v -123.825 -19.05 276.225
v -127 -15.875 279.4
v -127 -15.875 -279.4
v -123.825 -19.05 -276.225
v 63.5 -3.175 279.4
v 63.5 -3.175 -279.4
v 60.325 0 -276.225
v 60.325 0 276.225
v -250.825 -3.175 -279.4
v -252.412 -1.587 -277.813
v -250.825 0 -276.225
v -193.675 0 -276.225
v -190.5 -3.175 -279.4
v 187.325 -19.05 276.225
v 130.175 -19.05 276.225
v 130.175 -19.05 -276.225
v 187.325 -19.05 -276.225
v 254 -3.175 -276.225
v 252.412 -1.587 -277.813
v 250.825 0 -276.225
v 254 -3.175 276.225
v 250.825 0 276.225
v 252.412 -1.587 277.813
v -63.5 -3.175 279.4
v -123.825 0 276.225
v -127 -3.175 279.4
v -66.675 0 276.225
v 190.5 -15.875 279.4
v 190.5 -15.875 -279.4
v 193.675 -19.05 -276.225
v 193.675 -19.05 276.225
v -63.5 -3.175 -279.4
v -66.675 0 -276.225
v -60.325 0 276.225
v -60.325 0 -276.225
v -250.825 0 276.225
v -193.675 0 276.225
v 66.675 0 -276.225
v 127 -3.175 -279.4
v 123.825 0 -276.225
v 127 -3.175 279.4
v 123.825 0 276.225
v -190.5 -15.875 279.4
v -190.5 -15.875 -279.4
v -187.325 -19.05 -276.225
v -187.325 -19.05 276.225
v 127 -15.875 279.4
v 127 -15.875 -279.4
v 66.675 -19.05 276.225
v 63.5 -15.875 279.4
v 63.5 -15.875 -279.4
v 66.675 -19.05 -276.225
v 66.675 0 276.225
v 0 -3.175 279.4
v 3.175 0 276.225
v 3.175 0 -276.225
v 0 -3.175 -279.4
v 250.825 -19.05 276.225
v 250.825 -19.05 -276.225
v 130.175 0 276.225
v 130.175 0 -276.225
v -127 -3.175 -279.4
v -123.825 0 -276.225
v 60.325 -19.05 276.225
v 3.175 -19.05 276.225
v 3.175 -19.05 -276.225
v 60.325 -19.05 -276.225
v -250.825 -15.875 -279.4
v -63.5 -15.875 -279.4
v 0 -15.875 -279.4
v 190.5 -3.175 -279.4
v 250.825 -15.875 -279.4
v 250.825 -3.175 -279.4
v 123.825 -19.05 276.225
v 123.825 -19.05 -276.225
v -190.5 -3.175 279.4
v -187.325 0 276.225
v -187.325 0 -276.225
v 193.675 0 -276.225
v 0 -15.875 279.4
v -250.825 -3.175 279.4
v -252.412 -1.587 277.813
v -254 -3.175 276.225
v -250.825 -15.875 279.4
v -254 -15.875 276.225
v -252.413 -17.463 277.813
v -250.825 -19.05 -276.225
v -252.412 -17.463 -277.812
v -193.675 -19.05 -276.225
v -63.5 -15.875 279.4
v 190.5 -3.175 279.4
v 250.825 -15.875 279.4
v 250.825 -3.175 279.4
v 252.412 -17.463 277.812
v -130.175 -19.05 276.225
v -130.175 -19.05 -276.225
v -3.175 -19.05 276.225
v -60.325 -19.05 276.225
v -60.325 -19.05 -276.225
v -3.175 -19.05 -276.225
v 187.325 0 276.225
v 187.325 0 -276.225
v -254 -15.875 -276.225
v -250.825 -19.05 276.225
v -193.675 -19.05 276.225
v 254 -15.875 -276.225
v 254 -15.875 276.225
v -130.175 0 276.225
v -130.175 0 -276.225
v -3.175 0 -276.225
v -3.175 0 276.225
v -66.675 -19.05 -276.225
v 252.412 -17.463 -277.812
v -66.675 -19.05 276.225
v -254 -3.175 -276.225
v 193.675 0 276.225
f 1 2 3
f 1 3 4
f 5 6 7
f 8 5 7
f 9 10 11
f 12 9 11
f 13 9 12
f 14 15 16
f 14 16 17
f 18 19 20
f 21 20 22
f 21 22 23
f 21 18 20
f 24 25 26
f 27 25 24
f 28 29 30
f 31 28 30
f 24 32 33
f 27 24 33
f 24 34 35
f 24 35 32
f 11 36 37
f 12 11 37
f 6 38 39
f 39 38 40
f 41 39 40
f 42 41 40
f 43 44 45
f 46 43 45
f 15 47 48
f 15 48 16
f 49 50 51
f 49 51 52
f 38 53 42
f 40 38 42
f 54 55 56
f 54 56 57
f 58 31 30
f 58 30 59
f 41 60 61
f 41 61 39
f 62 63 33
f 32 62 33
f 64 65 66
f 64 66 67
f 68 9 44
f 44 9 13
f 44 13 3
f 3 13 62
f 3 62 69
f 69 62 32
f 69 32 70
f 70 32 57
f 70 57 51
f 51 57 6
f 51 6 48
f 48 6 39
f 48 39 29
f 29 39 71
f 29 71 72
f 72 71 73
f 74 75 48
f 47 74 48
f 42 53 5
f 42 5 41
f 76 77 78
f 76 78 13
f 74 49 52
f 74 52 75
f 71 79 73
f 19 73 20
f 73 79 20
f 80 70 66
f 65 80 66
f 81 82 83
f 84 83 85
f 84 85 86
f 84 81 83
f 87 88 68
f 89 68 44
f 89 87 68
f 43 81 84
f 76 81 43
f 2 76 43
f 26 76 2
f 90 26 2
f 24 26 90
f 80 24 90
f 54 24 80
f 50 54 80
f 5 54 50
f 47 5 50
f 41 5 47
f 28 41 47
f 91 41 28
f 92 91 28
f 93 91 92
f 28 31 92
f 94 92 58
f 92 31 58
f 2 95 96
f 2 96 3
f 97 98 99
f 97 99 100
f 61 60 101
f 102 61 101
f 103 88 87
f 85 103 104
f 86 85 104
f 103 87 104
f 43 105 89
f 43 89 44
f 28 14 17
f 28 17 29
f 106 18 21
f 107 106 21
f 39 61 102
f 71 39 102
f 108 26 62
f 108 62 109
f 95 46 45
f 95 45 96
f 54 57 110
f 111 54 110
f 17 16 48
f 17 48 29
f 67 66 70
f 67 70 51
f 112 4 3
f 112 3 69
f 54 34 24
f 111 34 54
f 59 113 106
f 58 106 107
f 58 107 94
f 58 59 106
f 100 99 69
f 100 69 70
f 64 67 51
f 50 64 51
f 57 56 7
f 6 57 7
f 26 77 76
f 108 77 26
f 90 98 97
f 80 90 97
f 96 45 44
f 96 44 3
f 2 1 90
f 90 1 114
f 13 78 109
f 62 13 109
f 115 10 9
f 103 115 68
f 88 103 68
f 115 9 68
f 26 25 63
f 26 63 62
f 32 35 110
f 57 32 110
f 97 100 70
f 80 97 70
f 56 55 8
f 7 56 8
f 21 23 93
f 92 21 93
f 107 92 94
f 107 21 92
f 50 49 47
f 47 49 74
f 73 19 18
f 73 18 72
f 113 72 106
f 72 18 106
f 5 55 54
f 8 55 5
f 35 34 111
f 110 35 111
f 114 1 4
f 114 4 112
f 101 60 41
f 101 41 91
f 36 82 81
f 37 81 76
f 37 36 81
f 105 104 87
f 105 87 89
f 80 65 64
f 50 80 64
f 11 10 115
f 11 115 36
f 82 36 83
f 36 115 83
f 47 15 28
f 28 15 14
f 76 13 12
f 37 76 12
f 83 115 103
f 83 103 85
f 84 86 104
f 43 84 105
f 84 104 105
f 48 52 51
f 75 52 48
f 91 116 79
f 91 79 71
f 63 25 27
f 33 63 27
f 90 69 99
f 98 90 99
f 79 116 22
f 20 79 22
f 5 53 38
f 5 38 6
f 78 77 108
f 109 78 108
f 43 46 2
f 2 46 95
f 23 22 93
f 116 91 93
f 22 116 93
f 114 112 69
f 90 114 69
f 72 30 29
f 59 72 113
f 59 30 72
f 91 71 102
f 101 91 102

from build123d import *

# Parameters (mm, degrees)
F0_W      = 508
F0_H      = 558.8
F1_DEPTH  = 19.05
F3_DEPTH  = 558.801
F4_SIZE   = 3.17499
F5_SIZE   = 3.175
F7_DEPTH  = 558.801
F8_SIZE   = 3.17499
F8_SIZE_2 = 3.175


# Not quite as in the source:
# - a fillet or chamfer is up to 0.001 mm smaller than in the source, because OpenCascade refuses the exact size


with BuildPart() as f1:
    # F0 (on Front) → F1 (new body)
    with BuildSketch(Plane.XZ):
        Rectangle(F0_W, F0_H)
    extrude(amount=F1_DEPTH)

    # F2 (on face) → F3 (cut, through all)
    with BuildSketch(Plane(origin=(0, 0, -279.4), x_dir=(1, 0, 0), z_dir=(0, 0, -1))):
        Polygon((190.5, 19.05), (187.325, 19.05), (190.5, 15.875), (193.675, 19.05), align=None)
        Polygon((127, 19.05), (123.825, 19.05), (127, 15.875), (130.175, 19.05), align=None)
        Polygon((63.5, 19.05), (60.325, 19.05), (63.5, 15.875), (66.675, 19.05), align=None)
        Polygon((0, 19.05), (-3.175, 19.05), (0, 15.875), (3.175, 19.05), align=None)
        Polygon((-63.5, 19.05), (-66.675, 19.05), (-63.5, 15.875), (-60.325, 19.05), align=None)
        Polygon((-127, 19.05), (-130.175, 19.05), (-127, 15.875), (-123.825, 19.05), align=None)
        Polygon((-190.5, 19.05), (-193.675, 19.05), (-190.5, 15.875), (-187.325, 19.05), align=None)
    extrude(amount=-F3_DEPTH, mode=Mode.SUBTRACT)

    # F4 (size 3.175 in the source; OpenCascade refuses exactly that, so slightly less here)
    f4_edges = [f1.edges().sort_by_distance(p)[0] for p in [
        (-254, -19.05, 0),
        (-223.8375, -19.05, -279.4),
        (-158.75, -19.05, -279.4),
        (-95.25, -19.05, -279.4),
        (-31.75, -19.05, -279.4),
        (31.75, -19.05, -279.4),
        (95.25, -19.05, -279.4),
        (158.75, -19.05, -279.4),
        (223.8375, -19.05, -279.4),
        (254, -19.05, 0),
        (223.8375, -19.05, 279.4),
        (158.75, -19.05, 279.4),
        (95.25, -19.05, 279.4),
        (31.75, -19.05, 279.4),
        (-31.75, -19.05, 279.4),
        (-95.25, -19.05, 279.4),
        (-158.75, -19.05, 279.4),
        (-223.8375, -19.05, 279.4),
    ]]
    chamfer(f4_edges, length=F4_SIZE)

    # F5
    f5_edges = [f1.edges().sort_by_distance(p)[0] for p in [
        (-254, -7.937505, 279.4),
        (-254, -7.937505, -279.4),
        (254, -7.937505, -279.4),
        (254, -7.937505, 279.4),
    ]]
    chamfer(f5_edges, length=F5_SIZE)

    # F6 (on face) → F7 (cut, through all)
    with BuildSketch(Plane(origin=(0, 0, -279.4), x_dir=(1, 0, 0), z_dir=(0, 0, -1))):
        Polygon((-193.675, 0), (-190.5, 0), (-187.325, 0), (-190.5, 3.175), align=None)
        Polygon((-123.825, 0), (-127, 3.175), (-130.175, 0), (-127, 0), align=None)
        Polygon((-60.325, 0), (-63.5, 3.175), (-66.675, 0), (-63.5, 0), align=None)
        Polygon((3.175, 0), (0, 3.175), (-3.175, 0), (0, 0), align=None)
        Polygon((66.675, 0), (63.5, 3.175), (60.325, 0), (63.5, 0), align=None)
        Polygon((130.175, 0), (127, 3.175), (123.825, 0), (127, 0), align=None)
        Polygon((193.675, 0), (190.5, 3.175), (187.325, 0), (190.5, 0), align=None)
    extrude(amount=-F7_DEPTH, mode=Mode.SUBTRACT)

    # F8 (call 1 of 18: OpenCascade refuses the feature's edges together) (size 3.175 in the source; OpenCascade refuses exactly that, so slightly less here)
    f8_edges = [f1.edges().sort_by_distance(p)[0] for p in [
        (-222.25, 0, -279.4),
    ]]
    chamfer(f8_edges, length=F8_SIZE)

    # F8#2 (call 2 of 18)
    f8_2_edges = [f1.edges().sort_by_distance(p)[0] for p in [
        (-254, 0, 0),
    ]]
    chamfer(f8_2_edges, length=F8_SIZE_2)

    # F8#3 (call 3 of 18) (size 3.175 in the source; OpenCascade refuses exactly that, so slightly less here)
    f8_3_edges = [f1.edges().sort_by_distance(p)[0] for p in [
        (-158.75, 0, -279.4),
    ]]
    chamfer(f8_3_edges, length=F8_SIZE)

    # F8#4 (call 4 of 18) (size 3.175 in the source; OpenCascade refuses exactly that, so slightly less here)
    f8_4_edges = [f1.edges().sort_by_distance(p)[0] for p in [
        (-95.25, 0, -279.4),
    ]]
    chamfer(f8_4_edges, length=F8_SIZE)

    # F8#5 (call 5 of 18) (size 3.175 in the source; OpenCascade refuses exactly that, so slightly less here)
    f8_5_edges = [f1.edges().sort_by_distance(p)[0] for p in [
        (-31.75, 0, -279.4),
    ]]
    chamfer(f8_5_edges, length=F8_SIZE)

    # F8#6 (call 6 of 18) (size 3.175 in the source; OpenCascade refuses exactly that, so slightly less here)
    f8_6_edges = [f1.edges().sort_by_distance(p)[0] for p in [
        (31.75, 0, -279.4),
    ]]
    chamfer(f8_6_edges, length=F8_SIZE)

    # F8#7 (call 7 of 18) (size 3.175 in the source; OpenCascade refuses exactly that, so slightly less here)
    f8_7_edges = [f1.edges().sort_by_distance(p)[0] for p in [
        (95.25, 0, -279.4),
    ]]
    chamfer(f8_7_edges, length=F8_SIZE)

    # F8#8 (call 8 of 18) (size 3.175 in the source; OpenCascade refuses exactly that, so slightly less here)
    f8_8_edges = [f1.edges().sort_by_distance(p)[0] for p in [
        (158.75, 0, -279.4),
    ]]
    chamfer(f8_8_edges, length=F8_SIZE)

    # F8#9 (call 9 of 18) (size 3.175 in the source; OpenCascade refuses exactly that, so slightly less here)
    f8_9_edges = [f1.edges().sort_by_distance(p)[0] for p in [
        (222.25, 0, -279.4),
    ]]
    chamfer(f8_9_edges, length=F8_SIZE)

    # F8#10 (call 10 of 18)
    f8_10_edges = [f1.edges().sort_by_distance(p)[0] for p in [
        (254, 0, 0),
    ]]
    chamfer(f8_10_edges, length=F8_SIZE_2)

    # F8#11 (call 11 of 18) (size 3.175 in the source; OpenCascade refuses exactly that, so slightly less here)
    f8_11_edges = [f1.edges().sort_by_distance(p)[0] for p in [
        (222.25, 0, 279.4),
    ]]
    chamfer(f8_11_edges, length=F8_SIZE)

    # F8#12 (call 12 of 18) (size 3.175 in the source; OpenCascade refuses exactly that, so slightly less here)
    f8_12_edges = [f1.edges().sort_by_distance(p)[0] for p in [
        (158.75, 0, 279.4),
    ]]
    chamfer(f8_12_edges, length=F8_SIZE)

    # F8#13 (call 13 of 18) (size 3.175 in the source; OpenCascade refuses exactly that, so slightly less here)
    f8_13_edges = [f1.edges().sort_by_distance(p)[0] for p in [
        (95.25, 0, 279.4),
    ]]
    chamfer(f8_13_edges, length=F8_SIZE)

    # F8#14 (call 14 of 18) (size 3.175 in the source; OpenCascade refuses exactly that, so slightly less here)
    f8_14_edges = [f1.edges().sort_by_distance(p)[0] for p in [
        (31.75, 0, 279.4),
    ]]
    chamfer(f8_14_edges, length=F8_SIZE)

    # F8#15 (call 15 of 18) (size 3.175 in the source; OpenCascade refuses exactly that, so slightly less here)
    f8_15_edges = [f1.edges().sort_by_distance(p)[0] for p in [
        (-31.75, 0, 279.4),
    ]]
    chamfer(f8_15_edges, length=F8_SIZE)

    # F8#16 (call 16 of 18) (size 3.175 in the source; OpenCascade refuses exactly that, so slightly less here)
    f8_16_edges = [f1.edges().sort_by_distance(p)[0] for p in [
        (-95.25, 0, 279.4),
    ]]
    chamfer(f8_16_edges, length=F8_SIZE)

    # F8#17 (call 17 of 18) (size 3.175 in the source; OpenCascade refuses exactly that, so slightly less here)
    f8_17_edges = [f1.edges().sort_by_distance(p)[0] for p in [
        (-158.75, 0, 279.4),
    ]]
    chamfer(f8_17_edges, length=F8_SIZE)

    # F8#18 (call 18 of 18) (size 3.175 in the source; OpenCascade refuses exactly that, so slightly less here)
    f8_18_edges = [f1.edges().sort_by_distance(p)[0] for p in [
        (-222.25, 0, 279.4),
    ]]
    chamfer(f8_18_edges, length=F8_SIZE)


solid = f1.part
